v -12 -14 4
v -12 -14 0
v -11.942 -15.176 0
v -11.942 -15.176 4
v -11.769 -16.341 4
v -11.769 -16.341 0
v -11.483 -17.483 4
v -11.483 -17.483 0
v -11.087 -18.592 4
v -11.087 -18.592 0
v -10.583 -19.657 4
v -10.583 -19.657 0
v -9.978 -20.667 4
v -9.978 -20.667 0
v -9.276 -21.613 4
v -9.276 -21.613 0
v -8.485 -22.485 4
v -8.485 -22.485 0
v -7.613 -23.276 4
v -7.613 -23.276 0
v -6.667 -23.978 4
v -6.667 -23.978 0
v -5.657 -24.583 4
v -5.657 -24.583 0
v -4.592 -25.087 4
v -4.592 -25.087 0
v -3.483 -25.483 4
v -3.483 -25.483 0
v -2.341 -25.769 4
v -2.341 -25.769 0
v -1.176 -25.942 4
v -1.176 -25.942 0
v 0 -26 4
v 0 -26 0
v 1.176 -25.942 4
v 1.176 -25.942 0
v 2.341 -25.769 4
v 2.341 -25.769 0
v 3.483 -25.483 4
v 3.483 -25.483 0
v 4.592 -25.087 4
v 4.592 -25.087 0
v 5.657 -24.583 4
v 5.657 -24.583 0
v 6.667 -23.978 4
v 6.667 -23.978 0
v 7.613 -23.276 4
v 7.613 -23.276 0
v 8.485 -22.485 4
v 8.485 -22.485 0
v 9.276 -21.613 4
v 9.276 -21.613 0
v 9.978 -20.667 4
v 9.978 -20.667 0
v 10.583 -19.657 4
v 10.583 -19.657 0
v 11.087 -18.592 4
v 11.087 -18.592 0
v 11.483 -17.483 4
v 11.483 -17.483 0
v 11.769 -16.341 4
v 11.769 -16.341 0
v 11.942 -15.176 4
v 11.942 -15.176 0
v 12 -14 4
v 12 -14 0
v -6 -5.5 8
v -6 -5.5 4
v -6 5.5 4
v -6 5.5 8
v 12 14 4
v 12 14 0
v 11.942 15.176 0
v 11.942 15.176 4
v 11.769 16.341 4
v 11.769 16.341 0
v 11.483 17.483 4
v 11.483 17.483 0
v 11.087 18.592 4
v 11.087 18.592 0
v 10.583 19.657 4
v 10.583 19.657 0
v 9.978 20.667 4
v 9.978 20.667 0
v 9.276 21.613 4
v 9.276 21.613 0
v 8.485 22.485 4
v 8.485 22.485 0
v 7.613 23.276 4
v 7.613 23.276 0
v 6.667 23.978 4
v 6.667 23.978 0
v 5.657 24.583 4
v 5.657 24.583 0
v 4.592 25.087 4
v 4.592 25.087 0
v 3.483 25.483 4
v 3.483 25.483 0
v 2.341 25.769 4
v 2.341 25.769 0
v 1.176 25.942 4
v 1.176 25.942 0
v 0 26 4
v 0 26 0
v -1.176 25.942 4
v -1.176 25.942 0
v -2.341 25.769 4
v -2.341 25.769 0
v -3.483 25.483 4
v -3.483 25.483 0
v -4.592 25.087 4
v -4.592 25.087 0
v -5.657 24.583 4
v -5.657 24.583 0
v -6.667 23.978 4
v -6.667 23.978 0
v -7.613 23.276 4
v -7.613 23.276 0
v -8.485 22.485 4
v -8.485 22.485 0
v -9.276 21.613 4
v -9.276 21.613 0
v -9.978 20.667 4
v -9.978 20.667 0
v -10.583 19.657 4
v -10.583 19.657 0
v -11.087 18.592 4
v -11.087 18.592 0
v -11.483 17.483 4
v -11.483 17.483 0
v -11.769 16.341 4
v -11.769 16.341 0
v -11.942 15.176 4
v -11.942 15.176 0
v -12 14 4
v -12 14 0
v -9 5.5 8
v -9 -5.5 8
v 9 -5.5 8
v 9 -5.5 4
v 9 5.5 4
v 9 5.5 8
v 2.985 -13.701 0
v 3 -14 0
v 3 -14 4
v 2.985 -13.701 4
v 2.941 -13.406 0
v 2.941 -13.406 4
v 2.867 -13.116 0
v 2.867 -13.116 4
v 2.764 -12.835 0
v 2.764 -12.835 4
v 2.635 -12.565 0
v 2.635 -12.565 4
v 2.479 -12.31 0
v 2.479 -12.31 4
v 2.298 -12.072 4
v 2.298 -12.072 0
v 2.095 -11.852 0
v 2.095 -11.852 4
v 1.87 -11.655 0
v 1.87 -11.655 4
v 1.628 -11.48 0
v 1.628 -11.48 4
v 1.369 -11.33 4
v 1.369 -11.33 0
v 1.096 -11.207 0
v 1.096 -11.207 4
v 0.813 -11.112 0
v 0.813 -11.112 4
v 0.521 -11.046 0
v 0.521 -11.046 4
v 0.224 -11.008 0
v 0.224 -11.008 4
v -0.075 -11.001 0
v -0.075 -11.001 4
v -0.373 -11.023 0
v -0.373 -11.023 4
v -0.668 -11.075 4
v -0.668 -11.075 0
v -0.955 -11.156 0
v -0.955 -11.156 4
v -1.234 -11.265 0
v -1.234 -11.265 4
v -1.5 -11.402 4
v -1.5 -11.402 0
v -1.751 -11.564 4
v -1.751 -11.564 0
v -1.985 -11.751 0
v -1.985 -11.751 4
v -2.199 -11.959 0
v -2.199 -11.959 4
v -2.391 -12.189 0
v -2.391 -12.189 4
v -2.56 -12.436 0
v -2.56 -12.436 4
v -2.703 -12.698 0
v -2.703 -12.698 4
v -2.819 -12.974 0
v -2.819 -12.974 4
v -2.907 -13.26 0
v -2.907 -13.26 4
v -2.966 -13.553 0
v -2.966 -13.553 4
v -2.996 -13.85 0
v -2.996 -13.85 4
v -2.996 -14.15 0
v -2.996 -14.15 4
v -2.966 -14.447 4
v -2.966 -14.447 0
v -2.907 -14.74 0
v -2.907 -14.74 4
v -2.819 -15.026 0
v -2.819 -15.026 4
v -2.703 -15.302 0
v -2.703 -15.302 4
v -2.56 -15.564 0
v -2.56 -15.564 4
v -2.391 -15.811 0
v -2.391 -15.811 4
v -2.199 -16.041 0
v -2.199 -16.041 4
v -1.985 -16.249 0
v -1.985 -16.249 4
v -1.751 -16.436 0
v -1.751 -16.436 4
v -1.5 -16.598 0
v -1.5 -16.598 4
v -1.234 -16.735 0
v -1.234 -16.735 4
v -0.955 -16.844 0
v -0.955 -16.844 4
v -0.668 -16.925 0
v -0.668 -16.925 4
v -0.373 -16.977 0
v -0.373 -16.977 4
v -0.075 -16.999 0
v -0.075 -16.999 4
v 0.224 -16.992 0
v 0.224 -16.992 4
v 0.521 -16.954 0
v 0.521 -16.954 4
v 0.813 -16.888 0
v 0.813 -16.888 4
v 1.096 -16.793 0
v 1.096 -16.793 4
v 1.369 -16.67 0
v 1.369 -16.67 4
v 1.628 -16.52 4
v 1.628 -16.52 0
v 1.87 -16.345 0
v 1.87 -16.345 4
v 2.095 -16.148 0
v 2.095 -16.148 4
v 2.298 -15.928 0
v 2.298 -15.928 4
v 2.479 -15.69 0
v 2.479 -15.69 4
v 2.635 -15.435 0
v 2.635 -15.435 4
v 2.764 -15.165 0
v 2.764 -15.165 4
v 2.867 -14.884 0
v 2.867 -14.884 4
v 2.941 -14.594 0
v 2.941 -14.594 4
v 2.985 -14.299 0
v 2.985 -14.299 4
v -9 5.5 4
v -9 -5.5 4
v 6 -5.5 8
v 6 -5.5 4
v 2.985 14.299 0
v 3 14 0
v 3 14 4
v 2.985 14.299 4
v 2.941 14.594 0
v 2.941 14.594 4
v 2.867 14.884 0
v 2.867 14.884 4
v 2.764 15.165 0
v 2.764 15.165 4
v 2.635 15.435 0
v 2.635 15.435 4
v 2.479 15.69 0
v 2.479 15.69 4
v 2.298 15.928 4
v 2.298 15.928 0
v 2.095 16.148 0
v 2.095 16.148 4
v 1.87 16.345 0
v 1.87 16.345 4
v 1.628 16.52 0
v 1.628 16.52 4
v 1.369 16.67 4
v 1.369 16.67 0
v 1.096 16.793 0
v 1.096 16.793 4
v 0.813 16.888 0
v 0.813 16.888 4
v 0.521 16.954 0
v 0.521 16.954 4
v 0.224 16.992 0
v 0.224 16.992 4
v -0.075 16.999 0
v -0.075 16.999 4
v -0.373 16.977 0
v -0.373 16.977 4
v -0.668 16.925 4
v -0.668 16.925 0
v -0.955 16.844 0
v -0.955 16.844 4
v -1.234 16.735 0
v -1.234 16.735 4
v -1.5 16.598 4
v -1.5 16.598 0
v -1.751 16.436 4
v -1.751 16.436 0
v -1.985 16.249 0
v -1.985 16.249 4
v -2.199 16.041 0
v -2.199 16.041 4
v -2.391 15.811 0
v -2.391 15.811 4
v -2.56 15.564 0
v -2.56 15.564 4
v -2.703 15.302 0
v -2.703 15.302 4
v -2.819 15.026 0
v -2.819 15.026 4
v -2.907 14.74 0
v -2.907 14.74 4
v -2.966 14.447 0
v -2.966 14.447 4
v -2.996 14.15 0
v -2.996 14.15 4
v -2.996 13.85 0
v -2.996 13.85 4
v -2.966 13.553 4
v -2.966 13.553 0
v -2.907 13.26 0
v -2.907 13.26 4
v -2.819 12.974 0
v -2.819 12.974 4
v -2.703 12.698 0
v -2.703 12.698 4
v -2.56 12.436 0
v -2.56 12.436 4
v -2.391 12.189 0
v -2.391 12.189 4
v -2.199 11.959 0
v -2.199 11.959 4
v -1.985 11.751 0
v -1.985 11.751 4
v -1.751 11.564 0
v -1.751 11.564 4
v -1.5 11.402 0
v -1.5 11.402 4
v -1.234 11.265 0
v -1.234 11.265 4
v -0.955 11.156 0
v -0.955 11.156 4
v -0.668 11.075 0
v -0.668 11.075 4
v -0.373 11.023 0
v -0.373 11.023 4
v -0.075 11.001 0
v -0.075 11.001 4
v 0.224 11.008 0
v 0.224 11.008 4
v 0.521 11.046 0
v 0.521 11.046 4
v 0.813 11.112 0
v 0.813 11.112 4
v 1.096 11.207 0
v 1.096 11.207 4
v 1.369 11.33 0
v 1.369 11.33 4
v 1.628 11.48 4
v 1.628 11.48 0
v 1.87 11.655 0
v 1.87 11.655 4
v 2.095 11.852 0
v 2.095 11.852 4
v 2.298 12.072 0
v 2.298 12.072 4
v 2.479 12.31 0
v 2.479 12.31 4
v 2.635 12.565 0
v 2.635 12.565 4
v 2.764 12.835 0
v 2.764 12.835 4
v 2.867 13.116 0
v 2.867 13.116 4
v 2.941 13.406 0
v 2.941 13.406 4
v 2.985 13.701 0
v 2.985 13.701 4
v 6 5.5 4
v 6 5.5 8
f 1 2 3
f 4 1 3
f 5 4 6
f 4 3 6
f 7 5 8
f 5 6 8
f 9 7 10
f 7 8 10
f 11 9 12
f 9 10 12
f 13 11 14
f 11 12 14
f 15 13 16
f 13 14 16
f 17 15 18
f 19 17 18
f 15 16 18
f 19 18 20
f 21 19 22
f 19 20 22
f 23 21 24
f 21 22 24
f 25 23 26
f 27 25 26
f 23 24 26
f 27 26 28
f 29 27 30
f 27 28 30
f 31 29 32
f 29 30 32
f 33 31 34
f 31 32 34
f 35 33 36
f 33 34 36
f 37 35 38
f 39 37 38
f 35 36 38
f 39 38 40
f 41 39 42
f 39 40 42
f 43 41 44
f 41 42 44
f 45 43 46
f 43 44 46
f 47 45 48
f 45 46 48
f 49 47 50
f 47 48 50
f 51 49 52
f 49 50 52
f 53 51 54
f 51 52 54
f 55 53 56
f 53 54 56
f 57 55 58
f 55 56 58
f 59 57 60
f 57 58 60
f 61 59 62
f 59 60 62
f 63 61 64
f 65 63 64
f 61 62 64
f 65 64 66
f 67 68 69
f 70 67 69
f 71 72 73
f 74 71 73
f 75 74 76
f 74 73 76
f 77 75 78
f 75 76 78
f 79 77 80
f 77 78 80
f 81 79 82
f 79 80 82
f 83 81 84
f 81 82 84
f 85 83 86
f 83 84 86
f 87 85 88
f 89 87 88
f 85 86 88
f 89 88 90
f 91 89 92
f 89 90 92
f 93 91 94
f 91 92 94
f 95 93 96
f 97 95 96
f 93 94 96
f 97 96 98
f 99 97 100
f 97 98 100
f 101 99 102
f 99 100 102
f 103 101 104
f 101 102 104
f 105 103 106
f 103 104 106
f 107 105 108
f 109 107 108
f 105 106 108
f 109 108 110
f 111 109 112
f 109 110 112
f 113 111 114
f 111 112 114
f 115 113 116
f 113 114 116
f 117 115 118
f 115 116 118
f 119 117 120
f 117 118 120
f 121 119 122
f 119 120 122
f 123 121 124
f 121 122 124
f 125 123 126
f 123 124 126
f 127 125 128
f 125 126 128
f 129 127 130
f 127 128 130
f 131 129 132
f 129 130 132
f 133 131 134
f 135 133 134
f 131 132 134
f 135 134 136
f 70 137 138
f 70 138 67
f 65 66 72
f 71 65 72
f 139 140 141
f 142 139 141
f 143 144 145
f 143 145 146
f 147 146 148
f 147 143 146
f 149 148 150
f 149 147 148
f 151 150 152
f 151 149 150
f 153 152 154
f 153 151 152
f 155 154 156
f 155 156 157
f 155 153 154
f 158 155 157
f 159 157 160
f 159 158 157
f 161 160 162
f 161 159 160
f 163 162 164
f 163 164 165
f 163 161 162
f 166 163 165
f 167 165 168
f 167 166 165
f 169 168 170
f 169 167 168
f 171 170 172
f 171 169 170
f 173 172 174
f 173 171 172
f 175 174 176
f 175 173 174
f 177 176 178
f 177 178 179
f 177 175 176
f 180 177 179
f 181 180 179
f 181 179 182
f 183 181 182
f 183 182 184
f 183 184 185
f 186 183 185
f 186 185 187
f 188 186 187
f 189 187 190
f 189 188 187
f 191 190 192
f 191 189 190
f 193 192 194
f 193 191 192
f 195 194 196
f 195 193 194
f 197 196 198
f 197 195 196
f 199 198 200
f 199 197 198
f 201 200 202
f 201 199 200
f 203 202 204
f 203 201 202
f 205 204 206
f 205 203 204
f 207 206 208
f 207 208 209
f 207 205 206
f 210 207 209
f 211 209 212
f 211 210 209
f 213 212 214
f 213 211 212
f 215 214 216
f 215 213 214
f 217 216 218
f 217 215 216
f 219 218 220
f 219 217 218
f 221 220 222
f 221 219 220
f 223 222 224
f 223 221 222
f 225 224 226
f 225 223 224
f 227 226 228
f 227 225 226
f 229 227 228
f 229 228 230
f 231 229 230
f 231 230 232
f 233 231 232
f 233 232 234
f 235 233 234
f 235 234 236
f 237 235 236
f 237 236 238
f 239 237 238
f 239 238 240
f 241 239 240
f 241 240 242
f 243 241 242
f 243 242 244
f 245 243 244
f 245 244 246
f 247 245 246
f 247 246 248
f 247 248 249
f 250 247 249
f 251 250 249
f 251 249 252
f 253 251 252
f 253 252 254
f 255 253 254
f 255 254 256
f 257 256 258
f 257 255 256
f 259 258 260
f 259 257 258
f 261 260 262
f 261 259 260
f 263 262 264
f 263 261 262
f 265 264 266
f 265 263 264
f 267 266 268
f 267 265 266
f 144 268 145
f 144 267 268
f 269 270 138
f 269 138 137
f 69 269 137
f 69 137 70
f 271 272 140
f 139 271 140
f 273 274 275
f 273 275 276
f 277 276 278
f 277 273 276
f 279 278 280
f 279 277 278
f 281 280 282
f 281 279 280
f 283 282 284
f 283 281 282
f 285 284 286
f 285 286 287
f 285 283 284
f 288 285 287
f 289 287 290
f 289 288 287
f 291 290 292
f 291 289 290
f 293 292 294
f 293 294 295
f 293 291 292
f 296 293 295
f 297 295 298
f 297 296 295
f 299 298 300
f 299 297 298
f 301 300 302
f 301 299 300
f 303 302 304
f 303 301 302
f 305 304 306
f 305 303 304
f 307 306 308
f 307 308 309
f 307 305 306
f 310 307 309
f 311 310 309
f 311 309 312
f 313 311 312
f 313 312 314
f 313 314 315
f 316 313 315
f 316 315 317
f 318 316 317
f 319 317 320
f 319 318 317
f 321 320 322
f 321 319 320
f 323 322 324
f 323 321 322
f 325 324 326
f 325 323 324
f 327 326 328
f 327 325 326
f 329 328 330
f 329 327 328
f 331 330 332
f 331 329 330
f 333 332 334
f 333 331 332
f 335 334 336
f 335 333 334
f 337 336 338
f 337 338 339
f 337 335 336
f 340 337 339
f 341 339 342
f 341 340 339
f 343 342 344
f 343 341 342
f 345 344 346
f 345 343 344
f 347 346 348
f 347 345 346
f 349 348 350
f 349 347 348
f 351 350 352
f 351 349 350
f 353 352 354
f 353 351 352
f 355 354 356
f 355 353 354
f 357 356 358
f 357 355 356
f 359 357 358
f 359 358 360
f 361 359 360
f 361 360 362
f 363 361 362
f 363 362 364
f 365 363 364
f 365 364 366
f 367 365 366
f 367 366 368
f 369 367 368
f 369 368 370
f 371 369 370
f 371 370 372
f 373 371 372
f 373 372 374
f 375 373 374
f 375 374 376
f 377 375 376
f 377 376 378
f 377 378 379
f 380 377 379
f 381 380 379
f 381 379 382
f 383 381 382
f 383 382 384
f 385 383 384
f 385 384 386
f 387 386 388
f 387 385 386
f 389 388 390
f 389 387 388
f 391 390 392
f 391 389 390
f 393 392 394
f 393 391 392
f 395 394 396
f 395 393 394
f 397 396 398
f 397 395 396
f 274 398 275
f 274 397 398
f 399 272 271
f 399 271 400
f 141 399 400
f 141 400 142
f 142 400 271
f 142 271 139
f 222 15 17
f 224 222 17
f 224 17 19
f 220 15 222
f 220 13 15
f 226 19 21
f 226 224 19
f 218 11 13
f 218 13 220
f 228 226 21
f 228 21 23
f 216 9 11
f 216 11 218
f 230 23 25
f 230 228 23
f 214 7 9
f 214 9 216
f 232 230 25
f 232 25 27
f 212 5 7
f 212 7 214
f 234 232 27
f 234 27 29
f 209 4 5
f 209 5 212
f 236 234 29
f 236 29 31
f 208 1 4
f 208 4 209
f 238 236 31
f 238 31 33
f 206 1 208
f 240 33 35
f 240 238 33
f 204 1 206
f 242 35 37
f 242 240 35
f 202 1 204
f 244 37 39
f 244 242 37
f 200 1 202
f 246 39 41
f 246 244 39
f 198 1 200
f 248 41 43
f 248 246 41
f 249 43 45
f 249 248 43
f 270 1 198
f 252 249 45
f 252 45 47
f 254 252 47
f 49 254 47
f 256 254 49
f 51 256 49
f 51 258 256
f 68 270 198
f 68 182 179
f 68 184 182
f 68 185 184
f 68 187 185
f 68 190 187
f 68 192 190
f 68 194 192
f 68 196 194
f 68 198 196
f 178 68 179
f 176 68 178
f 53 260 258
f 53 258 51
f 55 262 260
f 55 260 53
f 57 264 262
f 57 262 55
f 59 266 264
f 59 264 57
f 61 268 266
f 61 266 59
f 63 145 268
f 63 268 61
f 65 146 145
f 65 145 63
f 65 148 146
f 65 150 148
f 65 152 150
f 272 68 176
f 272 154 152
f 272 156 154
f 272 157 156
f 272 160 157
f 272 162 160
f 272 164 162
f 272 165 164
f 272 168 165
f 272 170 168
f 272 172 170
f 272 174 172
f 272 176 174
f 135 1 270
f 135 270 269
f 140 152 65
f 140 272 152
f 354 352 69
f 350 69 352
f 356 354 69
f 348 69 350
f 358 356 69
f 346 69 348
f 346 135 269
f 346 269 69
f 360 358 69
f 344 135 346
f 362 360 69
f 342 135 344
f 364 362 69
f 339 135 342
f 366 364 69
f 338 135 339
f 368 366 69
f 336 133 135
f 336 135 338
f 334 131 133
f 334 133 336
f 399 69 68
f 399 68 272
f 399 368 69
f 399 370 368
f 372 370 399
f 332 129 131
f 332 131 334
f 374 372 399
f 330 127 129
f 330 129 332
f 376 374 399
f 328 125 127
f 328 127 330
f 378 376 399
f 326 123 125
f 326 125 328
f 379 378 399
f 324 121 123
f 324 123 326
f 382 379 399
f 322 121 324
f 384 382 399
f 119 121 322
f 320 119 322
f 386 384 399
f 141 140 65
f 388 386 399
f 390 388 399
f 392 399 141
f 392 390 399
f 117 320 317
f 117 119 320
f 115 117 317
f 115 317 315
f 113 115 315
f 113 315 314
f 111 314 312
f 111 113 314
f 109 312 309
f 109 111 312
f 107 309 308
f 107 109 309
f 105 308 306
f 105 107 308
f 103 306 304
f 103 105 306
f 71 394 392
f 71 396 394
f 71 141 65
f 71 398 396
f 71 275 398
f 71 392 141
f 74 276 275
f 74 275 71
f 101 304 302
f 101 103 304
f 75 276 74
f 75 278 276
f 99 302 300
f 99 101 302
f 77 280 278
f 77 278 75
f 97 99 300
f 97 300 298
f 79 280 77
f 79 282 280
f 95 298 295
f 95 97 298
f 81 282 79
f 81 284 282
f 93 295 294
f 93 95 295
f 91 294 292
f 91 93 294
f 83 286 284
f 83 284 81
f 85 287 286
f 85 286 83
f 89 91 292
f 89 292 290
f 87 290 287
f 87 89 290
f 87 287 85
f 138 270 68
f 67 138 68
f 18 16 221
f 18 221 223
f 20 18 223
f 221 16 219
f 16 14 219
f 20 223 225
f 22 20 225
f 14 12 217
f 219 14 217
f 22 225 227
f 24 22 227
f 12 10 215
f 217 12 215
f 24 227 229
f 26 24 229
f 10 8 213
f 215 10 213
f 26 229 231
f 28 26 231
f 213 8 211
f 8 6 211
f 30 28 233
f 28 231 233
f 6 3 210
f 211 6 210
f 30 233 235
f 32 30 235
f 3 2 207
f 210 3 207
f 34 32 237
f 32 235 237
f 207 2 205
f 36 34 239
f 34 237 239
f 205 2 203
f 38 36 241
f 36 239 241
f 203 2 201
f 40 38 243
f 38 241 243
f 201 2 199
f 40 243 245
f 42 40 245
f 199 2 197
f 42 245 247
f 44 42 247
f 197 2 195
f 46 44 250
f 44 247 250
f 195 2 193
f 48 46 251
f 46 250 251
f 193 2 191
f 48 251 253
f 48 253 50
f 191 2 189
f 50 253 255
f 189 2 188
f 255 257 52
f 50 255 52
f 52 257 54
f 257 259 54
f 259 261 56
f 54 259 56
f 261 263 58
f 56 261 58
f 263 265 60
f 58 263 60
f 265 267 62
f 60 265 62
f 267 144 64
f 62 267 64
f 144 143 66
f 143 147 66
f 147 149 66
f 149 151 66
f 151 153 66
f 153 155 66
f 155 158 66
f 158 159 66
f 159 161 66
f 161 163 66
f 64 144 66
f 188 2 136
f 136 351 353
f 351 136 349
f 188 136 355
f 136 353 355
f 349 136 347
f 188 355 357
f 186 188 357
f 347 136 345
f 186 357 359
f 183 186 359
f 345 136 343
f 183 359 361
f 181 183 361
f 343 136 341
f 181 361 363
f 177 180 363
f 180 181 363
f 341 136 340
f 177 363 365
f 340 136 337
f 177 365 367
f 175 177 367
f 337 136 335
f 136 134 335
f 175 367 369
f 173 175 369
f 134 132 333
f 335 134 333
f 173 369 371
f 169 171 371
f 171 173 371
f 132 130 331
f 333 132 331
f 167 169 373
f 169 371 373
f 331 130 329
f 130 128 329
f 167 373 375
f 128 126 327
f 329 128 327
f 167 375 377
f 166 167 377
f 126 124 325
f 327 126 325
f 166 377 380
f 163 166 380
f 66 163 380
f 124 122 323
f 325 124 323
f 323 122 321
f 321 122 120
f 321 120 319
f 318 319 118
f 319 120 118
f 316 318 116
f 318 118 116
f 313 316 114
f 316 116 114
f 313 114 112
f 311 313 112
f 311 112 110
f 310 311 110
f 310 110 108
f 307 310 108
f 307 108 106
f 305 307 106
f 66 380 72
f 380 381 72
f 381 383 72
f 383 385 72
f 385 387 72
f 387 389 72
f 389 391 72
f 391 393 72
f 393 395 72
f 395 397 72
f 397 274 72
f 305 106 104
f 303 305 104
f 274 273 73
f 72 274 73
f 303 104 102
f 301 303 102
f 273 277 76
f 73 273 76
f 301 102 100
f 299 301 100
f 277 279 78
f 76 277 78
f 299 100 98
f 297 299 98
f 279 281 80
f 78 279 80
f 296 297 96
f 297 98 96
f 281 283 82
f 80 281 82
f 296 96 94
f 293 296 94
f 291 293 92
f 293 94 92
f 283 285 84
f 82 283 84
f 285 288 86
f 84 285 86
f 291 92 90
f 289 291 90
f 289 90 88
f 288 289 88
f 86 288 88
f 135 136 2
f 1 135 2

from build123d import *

# Parameters (mm, degrees)
SKETCH_R     = 3
PAD_DEPTH    = 4
SKETCH001_W  = 3
SKETCH001_H  = 11
PAD001_DEPTH = 8


with BuildPart() as part:
    # Sketch → Pad (new body)
    with BuildSketch(Plane.XY):
        with BuildLine():
            ThreePointArc((12, 14), (0, 26), (-12, 14))
            Line((-12, 14), (-12, -14))
            ThreePointArc((-12, -14), (0, -26), (12, -14))
            Line((12, -14), (12, 14))
        make_face()
        with Locations((0, 14)):
            Circle(SKETCH_R, mode=Mode.SUBTRACT)
        with Locations((0, -14)):
            Circle(SKETCH_R, mode=Mode.SUBTRACT)
    extrude(amount=PAD_DEPTH)

    # Sketch001 → Pad001 (join)
    with BuildSketch(Plane.XY):
        with Locations((-7.5, 0)):
            Rectangle(SKETCH001_W, SKETCH001_H)
        with Locations((7.5, 0)):
            Rectangle(SKETCH001_W, SKETCH001_H)
    extrude(amount=PAD001_DEPTH)


solid = part.part
